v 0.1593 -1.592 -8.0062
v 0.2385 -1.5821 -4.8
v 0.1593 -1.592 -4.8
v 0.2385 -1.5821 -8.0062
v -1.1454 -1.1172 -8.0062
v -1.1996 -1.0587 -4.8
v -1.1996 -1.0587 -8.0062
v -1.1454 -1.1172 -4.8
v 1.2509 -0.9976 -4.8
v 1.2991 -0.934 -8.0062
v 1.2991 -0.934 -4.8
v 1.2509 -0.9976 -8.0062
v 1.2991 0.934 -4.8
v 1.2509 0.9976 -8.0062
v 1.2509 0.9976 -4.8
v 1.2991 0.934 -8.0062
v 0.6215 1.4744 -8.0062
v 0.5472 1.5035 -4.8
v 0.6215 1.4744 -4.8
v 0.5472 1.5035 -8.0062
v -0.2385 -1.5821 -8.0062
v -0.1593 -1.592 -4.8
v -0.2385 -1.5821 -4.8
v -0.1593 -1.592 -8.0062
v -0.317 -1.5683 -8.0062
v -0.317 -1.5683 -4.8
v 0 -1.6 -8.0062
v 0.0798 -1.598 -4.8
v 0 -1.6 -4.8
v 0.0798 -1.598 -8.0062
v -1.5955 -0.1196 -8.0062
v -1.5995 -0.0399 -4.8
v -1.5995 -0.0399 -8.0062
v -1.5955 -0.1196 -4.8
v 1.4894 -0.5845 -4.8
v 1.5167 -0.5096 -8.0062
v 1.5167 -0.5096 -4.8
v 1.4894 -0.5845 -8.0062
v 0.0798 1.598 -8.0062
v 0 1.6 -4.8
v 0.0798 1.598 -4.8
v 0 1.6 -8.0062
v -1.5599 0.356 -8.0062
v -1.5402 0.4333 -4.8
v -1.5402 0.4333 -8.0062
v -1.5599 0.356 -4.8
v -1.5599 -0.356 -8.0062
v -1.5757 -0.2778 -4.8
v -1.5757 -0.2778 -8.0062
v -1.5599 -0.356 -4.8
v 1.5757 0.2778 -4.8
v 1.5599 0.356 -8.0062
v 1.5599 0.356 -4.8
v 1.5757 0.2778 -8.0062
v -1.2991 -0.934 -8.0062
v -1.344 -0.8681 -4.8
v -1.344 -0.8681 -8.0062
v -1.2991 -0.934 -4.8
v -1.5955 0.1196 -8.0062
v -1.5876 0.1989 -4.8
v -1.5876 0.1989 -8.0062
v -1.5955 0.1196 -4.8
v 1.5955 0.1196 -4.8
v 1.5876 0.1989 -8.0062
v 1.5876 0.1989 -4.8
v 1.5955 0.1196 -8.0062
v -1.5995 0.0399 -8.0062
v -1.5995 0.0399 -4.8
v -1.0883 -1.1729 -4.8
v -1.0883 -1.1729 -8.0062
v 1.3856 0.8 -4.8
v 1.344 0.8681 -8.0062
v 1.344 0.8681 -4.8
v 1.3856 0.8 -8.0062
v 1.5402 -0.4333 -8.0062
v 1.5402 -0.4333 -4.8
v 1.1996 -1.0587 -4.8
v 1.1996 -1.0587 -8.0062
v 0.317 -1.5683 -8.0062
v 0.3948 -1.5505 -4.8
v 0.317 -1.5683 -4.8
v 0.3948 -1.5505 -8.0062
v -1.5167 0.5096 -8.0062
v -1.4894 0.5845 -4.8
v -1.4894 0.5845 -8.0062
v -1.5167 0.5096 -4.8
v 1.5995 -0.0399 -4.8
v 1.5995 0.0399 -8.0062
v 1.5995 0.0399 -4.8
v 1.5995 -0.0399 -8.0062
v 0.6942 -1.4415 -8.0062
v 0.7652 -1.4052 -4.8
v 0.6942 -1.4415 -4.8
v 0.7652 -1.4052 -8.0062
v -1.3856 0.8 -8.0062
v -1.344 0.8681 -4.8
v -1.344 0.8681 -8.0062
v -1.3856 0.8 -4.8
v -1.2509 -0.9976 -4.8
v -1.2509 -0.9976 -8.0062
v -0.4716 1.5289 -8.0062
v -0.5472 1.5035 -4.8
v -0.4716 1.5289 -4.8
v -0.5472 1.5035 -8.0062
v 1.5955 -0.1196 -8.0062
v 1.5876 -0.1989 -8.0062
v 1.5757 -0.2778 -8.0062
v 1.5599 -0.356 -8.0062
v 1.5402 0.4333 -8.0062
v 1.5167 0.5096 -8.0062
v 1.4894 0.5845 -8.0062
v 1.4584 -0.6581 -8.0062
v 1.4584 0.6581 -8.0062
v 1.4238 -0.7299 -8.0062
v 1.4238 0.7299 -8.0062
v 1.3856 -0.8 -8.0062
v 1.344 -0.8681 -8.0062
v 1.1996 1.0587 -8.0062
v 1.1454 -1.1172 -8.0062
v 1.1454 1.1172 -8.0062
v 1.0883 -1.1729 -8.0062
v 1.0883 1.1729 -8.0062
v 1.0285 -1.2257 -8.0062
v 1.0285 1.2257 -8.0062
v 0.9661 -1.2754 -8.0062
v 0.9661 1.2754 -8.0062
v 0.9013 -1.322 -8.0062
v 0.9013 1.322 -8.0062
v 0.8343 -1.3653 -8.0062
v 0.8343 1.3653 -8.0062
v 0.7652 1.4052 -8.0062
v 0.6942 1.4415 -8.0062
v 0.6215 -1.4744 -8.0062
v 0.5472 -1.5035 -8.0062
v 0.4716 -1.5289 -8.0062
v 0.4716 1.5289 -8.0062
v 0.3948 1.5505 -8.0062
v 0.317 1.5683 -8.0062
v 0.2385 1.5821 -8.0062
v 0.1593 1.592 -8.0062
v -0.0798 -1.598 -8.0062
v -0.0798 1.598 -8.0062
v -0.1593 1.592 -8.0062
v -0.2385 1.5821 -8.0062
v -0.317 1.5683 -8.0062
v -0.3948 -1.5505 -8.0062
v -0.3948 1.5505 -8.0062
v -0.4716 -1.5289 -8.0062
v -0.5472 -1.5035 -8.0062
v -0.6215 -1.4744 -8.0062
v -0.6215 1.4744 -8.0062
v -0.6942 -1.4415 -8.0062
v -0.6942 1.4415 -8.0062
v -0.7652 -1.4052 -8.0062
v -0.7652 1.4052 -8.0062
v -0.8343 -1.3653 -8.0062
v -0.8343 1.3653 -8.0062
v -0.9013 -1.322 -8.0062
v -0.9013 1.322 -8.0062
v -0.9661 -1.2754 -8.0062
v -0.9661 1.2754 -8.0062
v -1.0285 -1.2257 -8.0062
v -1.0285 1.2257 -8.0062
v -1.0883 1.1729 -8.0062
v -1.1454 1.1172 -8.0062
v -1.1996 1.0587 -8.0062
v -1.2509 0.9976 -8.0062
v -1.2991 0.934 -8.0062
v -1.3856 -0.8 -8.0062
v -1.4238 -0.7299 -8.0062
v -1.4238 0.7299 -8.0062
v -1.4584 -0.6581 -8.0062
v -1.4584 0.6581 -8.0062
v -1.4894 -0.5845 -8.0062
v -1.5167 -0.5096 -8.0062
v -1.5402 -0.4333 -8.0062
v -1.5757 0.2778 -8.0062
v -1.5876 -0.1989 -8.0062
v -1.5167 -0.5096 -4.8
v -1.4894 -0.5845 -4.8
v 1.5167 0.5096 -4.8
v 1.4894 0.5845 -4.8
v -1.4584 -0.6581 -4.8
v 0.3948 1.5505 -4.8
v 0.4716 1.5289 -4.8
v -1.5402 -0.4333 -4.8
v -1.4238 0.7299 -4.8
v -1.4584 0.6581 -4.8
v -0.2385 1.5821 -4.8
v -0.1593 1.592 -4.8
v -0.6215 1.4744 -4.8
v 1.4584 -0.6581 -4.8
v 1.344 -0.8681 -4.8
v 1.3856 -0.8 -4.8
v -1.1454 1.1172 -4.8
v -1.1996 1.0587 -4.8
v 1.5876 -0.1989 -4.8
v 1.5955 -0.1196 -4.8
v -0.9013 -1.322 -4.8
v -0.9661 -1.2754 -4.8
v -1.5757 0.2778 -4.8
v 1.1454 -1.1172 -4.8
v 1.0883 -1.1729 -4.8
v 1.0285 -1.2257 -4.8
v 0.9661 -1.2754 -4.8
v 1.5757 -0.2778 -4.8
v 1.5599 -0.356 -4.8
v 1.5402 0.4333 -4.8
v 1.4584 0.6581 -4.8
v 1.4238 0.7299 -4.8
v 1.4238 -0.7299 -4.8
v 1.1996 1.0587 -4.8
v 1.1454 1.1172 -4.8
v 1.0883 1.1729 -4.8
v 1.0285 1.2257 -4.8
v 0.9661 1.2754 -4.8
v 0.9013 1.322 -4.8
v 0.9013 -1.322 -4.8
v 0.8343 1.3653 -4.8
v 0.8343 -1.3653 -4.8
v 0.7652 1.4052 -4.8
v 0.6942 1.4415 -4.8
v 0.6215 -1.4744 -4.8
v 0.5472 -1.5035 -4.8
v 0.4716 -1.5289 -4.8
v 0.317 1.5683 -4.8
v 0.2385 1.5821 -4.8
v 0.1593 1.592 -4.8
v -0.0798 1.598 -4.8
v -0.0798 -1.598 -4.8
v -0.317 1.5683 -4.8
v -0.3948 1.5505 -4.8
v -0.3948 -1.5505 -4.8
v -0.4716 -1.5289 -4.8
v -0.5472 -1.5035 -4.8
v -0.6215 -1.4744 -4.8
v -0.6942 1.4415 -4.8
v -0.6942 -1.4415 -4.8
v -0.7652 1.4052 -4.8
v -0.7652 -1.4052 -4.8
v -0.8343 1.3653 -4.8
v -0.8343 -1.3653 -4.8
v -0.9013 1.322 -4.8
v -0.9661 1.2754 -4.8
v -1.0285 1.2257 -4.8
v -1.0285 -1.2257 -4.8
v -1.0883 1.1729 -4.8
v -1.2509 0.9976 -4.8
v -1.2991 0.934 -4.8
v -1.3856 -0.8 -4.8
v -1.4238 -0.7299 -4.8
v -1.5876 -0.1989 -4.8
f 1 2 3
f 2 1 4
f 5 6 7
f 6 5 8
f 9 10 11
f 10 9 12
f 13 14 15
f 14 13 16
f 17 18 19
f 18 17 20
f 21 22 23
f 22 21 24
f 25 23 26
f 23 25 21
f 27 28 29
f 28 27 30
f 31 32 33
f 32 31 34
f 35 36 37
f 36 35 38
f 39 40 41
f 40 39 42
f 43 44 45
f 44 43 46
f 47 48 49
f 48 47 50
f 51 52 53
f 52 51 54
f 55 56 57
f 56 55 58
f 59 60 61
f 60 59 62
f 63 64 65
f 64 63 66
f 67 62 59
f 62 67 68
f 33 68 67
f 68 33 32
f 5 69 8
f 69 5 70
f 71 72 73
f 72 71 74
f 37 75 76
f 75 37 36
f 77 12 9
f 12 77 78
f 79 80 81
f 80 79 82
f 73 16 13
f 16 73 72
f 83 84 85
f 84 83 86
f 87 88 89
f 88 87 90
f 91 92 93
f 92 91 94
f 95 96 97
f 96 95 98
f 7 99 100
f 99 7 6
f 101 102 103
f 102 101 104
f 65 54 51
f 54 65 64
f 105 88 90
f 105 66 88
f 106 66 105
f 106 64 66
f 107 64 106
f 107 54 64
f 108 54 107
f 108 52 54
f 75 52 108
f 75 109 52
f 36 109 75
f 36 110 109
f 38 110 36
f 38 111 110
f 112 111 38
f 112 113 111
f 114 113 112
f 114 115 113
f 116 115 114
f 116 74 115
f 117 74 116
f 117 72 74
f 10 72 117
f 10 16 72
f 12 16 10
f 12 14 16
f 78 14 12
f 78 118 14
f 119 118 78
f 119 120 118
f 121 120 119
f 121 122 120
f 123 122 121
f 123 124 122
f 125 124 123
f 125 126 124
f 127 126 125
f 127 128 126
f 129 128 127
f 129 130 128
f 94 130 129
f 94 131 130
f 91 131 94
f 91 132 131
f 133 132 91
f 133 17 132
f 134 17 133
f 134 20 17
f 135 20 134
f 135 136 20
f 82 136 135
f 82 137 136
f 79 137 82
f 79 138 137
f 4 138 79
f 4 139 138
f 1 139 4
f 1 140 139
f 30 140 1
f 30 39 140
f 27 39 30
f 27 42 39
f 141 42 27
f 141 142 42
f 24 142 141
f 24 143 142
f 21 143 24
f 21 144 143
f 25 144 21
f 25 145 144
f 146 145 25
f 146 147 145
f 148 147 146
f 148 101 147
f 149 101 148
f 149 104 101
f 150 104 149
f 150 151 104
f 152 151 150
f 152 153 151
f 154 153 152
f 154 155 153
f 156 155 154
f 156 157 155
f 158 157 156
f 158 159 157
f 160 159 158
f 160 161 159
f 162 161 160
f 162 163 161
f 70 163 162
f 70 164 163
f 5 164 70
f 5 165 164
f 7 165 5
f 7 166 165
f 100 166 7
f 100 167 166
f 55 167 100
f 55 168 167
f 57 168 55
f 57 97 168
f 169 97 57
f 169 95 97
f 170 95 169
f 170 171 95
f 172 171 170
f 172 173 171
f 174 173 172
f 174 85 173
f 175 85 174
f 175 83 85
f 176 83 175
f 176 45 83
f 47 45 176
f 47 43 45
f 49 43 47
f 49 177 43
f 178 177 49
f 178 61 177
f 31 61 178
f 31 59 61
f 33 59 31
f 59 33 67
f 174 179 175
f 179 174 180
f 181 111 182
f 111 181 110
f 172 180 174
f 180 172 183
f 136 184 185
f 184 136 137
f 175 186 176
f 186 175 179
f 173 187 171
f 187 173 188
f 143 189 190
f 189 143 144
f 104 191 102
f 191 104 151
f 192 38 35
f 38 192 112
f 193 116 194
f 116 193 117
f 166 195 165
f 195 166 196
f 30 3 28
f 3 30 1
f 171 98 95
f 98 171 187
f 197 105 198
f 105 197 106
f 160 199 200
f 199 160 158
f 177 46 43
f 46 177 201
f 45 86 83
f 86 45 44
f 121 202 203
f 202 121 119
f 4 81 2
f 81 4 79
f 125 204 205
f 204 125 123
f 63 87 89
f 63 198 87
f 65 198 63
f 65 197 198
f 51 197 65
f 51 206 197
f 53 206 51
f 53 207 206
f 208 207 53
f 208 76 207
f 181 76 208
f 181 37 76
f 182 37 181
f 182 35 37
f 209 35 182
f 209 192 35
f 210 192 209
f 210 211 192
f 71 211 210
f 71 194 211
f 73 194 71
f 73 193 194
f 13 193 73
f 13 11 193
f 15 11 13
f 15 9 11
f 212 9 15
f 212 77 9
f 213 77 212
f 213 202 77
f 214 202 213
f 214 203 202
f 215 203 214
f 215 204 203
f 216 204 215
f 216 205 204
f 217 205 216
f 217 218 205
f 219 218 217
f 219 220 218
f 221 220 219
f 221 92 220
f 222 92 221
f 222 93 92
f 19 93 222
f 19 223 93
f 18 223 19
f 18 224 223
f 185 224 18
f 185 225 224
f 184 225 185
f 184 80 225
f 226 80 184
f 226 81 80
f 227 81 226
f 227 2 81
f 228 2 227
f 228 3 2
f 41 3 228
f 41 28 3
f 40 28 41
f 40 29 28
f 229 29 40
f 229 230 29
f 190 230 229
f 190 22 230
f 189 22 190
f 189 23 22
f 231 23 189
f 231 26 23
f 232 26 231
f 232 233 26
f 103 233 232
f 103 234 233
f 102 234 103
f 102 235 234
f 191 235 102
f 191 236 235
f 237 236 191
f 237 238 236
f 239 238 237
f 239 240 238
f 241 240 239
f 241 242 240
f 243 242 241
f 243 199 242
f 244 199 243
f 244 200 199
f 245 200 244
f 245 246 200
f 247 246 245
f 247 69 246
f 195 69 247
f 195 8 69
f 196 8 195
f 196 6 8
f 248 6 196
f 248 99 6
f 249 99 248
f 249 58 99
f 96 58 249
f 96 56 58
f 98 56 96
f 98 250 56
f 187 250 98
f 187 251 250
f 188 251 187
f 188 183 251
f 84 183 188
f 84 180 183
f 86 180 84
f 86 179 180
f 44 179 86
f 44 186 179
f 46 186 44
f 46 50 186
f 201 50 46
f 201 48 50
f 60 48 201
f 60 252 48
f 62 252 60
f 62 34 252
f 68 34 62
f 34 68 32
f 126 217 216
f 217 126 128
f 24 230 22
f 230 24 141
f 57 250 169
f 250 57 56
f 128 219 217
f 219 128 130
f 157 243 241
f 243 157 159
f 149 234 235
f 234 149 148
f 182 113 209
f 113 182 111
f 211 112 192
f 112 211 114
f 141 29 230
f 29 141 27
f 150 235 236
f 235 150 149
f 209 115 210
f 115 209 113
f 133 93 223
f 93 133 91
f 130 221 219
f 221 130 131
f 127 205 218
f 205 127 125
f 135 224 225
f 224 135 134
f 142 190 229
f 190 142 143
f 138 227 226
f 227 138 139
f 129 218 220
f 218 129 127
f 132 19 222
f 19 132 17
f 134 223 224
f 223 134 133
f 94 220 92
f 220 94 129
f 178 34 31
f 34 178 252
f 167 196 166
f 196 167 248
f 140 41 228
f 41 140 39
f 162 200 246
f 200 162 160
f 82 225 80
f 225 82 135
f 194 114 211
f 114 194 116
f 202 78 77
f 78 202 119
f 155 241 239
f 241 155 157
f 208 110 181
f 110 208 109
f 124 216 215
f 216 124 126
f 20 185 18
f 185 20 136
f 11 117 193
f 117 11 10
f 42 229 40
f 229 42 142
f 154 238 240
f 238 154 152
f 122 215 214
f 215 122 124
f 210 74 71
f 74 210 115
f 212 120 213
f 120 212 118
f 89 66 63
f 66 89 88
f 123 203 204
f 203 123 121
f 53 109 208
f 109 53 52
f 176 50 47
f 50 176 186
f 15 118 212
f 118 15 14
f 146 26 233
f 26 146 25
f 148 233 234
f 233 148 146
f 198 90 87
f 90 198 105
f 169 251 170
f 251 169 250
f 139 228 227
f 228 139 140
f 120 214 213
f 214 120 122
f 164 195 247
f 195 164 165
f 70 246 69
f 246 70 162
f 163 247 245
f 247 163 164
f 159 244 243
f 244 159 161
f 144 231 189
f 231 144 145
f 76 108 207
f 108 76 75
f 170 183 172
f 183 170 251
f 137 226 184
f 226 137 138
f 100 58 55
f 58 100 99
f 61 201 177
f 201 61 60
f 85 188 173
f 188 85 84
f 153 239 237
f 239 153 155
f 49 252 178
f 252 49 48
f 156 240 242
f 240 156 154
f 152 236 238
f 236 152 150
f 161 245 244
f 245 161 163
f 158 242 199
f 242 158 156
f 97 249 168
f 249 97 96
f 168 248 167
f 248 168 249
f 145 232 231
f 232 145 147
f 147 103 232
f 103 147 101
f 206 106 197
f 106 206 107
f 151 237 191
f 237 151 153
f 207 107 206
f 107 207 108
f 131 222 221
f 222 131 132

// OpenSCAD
use <../lib.scad>
use <4141.scad>
use <4142.scad>
$fa=1; $fs=0.2;
function ldraw_lib__73071(realsolid=false) = [
// 0 Technic Differential
// 0 Name: 73071.dat
// 0 Author: James Jessiman
// 0 !LDRAW_ORG Shortcut UPDATE 2011-02
// 0 !LICENSE Licensed under CC BY 2.0 and CC BY 4.0 : see CAreadme.txt
// 
// 0 BFC CERTIFY CCW
  [0,"BFC","CERTIFY"],
  [0,"BFC","CCW"],
// 
// 0 !HISTORY 1998-06-20 [PTadmin] Official Update 1998-06
// 0 !HISTORY 2007-07-21 [PTadmin] Header formatted for Contributor Agreement
// 0 !HISTORY 2008-07-01 [PTadmin] Official Update 2008-01
// 0 !HISTORY 2008-07-07 [sbliss] Completed header. (2003-02-03)
// 0 !HISTORY 2008-07-08 [guyvivan] Made BFC Compliant (2004-08-07)
// 0 !HISTORY 2008-07-09 [guyvivan] Improve 48'ed and tooth (2004-11-05)
// 0 !HISTORY 2008-07-10 [Philo] Adapter rings between 28 teeth and 48 primitives (2007-10-16)
// 0 !HISTORY 2008-07-11 [Philo] Subparted teeth (2007-10-22)
// 0 !HISTORY 2008-07-12 [Philo] Split into constitutive parts (2007-10-26)
// 0 !HISTORY 2011-07-11 [Steffen] adjusted to modified origin of 4142.dat
// 0 !HISTORY 2011-12-29 [PTadmin] Official Update 2011-02
// 
// 
// 1 16 0 0 0 1 0 0 0 1 0 0 0 1 4141.dat
  [1,16,0,0,0,1,0,0,0,1,0,0,0,1, ldraw_lib__4141(realsolid)],
// 1 16 0 0 21.5 1 0 0 0 1 0 0 0 1 4142.dat
  [1,16,0,0,21.5,1,0,0,0,1,0,0,0,1, ldraw_lib__4142(realsolid)],
];
module ldraw_lib__73071(step=0, col=false, unit=2/5, alt=false, line=0.2, solid=!$preview)
    makepoly(ldraw_lib__73071(solid), step=step, col=col, unit=unit, alt=alt, line=line, solid=solid);
ldraw_lib__73071(line=0.2);
